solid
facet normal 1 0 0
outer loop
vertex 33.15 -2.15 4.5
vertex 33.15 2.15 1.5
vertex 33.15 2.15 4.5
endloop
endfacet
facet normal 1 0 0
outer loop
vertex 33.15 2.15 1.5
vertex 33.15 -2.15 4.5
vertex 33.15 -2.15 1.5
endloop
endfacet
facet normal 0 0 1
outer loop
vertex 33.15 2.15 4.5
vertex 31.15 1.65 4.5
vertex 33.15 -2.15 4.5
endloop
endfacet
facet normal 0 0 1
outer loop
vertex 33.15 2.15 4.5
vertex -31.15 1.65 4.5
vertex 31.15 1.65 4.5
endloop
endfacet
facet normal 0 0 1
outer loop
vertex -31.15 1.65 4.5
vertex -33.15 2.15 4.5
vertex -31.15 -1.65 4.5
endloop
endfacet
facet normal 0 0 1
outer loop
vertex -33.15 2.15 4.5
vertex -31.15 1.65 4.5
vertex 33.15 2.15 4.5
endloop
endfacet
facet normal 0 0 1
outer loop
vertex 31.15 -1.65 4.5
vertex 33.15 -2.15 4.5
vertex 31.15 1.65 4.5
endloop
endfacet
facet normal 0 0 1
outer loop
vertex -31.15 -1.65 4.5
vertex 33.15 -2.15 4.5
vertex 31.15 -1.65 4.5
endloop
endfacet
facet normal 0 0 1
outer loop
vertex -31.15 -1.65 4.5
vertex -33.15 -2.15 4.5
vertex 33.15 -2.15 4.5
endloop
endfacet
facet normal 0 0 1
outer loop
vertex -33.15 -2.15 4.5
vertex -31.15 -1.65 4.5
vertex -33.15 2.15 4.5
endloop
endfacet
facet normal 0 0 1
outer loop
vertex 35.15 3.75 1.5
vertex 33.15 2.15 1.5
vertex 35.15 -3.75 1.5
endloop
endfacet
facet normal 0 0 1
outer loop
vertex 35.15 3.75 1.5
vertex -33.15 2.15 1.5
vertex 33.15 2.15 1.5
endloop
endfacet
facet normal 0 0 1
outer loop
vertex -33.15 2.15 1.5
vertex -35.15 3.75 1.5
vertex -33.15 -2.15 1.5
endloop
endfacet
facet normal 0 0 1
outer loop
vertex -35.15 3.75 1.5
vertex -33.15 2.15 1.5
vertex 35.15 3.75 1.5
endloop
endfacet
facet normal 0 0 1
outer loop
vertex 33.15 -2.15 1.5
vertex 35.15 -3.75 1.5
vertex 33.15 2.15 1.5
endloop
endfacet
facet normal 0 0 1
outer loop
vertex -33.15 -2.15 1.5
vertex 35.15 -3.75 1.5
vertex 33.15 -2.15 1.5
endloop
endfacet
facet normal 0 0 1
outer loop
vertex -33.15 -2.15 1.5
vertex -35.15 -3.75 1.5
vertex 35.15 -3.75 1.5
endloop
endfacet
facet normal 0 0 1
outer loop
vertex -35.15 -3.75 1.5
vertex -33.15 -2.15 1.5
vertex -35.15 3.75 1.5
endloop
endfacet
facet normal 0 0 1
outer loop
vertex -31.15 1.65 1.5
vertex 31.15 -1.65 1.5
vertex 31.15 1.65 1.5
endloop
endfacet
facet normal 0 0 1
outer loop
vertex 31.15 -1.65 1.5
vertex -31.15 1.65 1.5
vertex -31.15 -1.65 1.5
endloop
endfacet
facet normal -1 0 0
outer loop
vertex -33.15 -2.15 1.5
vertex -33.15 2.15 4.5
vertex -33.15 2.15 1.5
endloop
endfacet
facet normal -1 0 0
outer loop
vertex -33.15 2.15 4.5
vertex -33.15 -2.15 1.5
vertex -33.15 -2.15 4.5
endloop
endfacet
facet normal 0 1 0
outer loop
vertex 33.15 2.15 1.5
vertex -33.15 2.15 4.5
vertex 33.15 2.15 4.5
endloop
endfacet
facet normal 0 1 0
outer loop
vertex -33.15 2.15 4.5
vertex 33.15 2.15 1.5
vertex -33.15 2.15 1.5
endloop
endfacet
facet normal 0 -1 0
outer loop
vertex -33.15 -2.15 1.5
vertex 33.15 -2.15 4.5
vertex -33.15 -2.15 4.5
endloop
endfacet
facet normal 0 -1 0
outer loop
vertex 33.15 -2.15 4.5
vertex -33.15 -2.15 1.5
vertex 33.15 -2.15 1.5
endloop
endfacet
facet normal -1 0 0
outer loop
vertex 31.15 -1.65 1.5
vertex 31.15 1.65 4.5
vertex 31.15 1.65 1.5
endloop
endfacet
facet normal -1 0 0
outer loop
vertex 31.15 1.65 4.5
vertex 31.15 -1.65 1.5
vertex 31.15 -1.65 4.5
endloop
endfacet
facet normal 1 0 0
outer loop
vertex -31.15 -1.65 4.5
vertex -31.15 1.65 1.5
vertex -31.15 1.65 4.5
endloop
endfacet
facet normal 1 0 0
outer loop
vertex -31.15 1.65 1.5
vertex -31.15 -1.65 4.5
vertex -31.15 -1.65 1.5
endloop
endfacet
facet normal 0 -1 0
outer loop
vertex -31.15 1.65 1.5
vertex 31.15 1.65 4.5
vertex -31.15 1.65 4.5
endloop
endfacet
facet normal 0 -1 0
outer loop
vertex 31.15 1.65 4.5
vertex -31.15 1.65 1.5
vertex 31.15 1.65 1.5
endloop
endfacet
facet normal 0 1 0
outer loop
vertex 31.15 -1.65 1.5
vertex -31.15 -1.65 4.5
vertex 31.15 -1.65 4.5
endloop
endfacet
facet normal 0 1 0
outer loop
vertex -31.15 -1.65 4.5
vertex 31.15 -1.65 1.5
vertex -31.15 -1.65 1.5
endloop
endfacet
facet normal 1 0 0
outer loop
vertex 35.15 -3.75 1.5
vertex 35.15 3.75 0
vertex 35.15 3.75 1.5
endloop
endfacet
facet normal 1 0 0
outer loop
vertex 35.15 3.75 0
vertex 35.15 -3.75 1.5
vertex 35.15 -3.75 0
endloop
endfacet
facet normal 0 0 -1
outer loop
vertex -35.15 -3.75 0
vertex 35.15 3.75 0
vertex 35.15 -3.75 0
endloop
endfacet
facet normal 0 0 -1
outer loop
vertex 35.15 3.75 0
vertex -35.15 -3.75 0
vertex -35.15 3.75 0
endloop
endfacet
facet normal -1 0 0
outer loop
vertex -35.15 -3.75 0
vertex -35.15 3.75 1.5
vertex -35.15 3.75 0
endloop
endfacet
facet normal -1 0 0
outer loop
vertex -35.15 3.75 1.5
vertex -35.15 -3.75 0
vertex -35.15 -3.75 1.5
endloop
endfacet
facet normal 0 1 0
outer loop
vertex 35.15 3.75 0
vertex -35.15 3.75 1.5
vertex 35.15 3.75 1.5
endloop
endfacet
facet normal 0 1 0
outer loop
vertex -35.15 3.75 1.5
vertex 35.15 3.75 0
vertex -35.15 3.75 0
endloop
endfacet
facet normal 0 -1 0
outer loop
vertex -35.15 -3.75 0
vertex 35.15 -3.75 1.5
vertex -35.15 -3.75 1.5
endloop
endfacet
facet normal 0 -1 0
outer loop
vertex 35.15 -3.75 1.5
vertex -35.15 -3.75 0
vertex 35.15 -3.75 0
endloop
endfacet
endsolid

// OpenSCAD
$widthpins = 30;
$connectorw = 6.3+($widthpins*2);
$connectorh = 4.3;
$innerthicknessx = 2;
$innerthicknessy = 0.5;
$outeroverhangw = 2;
$outeroverhangh = 1.6;
$depth = 3;
$outer = 1.5;
translate([0,0,$outer/2]) cube([$connectorw+($outeroverhangw*2), $connectorh+($outeroverhangh*2), $outer], true);
translate([0,0,($depth/2)+$outer]) {
    difference() {
        cube([$connectorw, $connectorh, $depth], true);
        cube([$connectorw-($innerthicknessx*2), $connectorh-($innerthicknessy*2), $depth], true);
    }
}
